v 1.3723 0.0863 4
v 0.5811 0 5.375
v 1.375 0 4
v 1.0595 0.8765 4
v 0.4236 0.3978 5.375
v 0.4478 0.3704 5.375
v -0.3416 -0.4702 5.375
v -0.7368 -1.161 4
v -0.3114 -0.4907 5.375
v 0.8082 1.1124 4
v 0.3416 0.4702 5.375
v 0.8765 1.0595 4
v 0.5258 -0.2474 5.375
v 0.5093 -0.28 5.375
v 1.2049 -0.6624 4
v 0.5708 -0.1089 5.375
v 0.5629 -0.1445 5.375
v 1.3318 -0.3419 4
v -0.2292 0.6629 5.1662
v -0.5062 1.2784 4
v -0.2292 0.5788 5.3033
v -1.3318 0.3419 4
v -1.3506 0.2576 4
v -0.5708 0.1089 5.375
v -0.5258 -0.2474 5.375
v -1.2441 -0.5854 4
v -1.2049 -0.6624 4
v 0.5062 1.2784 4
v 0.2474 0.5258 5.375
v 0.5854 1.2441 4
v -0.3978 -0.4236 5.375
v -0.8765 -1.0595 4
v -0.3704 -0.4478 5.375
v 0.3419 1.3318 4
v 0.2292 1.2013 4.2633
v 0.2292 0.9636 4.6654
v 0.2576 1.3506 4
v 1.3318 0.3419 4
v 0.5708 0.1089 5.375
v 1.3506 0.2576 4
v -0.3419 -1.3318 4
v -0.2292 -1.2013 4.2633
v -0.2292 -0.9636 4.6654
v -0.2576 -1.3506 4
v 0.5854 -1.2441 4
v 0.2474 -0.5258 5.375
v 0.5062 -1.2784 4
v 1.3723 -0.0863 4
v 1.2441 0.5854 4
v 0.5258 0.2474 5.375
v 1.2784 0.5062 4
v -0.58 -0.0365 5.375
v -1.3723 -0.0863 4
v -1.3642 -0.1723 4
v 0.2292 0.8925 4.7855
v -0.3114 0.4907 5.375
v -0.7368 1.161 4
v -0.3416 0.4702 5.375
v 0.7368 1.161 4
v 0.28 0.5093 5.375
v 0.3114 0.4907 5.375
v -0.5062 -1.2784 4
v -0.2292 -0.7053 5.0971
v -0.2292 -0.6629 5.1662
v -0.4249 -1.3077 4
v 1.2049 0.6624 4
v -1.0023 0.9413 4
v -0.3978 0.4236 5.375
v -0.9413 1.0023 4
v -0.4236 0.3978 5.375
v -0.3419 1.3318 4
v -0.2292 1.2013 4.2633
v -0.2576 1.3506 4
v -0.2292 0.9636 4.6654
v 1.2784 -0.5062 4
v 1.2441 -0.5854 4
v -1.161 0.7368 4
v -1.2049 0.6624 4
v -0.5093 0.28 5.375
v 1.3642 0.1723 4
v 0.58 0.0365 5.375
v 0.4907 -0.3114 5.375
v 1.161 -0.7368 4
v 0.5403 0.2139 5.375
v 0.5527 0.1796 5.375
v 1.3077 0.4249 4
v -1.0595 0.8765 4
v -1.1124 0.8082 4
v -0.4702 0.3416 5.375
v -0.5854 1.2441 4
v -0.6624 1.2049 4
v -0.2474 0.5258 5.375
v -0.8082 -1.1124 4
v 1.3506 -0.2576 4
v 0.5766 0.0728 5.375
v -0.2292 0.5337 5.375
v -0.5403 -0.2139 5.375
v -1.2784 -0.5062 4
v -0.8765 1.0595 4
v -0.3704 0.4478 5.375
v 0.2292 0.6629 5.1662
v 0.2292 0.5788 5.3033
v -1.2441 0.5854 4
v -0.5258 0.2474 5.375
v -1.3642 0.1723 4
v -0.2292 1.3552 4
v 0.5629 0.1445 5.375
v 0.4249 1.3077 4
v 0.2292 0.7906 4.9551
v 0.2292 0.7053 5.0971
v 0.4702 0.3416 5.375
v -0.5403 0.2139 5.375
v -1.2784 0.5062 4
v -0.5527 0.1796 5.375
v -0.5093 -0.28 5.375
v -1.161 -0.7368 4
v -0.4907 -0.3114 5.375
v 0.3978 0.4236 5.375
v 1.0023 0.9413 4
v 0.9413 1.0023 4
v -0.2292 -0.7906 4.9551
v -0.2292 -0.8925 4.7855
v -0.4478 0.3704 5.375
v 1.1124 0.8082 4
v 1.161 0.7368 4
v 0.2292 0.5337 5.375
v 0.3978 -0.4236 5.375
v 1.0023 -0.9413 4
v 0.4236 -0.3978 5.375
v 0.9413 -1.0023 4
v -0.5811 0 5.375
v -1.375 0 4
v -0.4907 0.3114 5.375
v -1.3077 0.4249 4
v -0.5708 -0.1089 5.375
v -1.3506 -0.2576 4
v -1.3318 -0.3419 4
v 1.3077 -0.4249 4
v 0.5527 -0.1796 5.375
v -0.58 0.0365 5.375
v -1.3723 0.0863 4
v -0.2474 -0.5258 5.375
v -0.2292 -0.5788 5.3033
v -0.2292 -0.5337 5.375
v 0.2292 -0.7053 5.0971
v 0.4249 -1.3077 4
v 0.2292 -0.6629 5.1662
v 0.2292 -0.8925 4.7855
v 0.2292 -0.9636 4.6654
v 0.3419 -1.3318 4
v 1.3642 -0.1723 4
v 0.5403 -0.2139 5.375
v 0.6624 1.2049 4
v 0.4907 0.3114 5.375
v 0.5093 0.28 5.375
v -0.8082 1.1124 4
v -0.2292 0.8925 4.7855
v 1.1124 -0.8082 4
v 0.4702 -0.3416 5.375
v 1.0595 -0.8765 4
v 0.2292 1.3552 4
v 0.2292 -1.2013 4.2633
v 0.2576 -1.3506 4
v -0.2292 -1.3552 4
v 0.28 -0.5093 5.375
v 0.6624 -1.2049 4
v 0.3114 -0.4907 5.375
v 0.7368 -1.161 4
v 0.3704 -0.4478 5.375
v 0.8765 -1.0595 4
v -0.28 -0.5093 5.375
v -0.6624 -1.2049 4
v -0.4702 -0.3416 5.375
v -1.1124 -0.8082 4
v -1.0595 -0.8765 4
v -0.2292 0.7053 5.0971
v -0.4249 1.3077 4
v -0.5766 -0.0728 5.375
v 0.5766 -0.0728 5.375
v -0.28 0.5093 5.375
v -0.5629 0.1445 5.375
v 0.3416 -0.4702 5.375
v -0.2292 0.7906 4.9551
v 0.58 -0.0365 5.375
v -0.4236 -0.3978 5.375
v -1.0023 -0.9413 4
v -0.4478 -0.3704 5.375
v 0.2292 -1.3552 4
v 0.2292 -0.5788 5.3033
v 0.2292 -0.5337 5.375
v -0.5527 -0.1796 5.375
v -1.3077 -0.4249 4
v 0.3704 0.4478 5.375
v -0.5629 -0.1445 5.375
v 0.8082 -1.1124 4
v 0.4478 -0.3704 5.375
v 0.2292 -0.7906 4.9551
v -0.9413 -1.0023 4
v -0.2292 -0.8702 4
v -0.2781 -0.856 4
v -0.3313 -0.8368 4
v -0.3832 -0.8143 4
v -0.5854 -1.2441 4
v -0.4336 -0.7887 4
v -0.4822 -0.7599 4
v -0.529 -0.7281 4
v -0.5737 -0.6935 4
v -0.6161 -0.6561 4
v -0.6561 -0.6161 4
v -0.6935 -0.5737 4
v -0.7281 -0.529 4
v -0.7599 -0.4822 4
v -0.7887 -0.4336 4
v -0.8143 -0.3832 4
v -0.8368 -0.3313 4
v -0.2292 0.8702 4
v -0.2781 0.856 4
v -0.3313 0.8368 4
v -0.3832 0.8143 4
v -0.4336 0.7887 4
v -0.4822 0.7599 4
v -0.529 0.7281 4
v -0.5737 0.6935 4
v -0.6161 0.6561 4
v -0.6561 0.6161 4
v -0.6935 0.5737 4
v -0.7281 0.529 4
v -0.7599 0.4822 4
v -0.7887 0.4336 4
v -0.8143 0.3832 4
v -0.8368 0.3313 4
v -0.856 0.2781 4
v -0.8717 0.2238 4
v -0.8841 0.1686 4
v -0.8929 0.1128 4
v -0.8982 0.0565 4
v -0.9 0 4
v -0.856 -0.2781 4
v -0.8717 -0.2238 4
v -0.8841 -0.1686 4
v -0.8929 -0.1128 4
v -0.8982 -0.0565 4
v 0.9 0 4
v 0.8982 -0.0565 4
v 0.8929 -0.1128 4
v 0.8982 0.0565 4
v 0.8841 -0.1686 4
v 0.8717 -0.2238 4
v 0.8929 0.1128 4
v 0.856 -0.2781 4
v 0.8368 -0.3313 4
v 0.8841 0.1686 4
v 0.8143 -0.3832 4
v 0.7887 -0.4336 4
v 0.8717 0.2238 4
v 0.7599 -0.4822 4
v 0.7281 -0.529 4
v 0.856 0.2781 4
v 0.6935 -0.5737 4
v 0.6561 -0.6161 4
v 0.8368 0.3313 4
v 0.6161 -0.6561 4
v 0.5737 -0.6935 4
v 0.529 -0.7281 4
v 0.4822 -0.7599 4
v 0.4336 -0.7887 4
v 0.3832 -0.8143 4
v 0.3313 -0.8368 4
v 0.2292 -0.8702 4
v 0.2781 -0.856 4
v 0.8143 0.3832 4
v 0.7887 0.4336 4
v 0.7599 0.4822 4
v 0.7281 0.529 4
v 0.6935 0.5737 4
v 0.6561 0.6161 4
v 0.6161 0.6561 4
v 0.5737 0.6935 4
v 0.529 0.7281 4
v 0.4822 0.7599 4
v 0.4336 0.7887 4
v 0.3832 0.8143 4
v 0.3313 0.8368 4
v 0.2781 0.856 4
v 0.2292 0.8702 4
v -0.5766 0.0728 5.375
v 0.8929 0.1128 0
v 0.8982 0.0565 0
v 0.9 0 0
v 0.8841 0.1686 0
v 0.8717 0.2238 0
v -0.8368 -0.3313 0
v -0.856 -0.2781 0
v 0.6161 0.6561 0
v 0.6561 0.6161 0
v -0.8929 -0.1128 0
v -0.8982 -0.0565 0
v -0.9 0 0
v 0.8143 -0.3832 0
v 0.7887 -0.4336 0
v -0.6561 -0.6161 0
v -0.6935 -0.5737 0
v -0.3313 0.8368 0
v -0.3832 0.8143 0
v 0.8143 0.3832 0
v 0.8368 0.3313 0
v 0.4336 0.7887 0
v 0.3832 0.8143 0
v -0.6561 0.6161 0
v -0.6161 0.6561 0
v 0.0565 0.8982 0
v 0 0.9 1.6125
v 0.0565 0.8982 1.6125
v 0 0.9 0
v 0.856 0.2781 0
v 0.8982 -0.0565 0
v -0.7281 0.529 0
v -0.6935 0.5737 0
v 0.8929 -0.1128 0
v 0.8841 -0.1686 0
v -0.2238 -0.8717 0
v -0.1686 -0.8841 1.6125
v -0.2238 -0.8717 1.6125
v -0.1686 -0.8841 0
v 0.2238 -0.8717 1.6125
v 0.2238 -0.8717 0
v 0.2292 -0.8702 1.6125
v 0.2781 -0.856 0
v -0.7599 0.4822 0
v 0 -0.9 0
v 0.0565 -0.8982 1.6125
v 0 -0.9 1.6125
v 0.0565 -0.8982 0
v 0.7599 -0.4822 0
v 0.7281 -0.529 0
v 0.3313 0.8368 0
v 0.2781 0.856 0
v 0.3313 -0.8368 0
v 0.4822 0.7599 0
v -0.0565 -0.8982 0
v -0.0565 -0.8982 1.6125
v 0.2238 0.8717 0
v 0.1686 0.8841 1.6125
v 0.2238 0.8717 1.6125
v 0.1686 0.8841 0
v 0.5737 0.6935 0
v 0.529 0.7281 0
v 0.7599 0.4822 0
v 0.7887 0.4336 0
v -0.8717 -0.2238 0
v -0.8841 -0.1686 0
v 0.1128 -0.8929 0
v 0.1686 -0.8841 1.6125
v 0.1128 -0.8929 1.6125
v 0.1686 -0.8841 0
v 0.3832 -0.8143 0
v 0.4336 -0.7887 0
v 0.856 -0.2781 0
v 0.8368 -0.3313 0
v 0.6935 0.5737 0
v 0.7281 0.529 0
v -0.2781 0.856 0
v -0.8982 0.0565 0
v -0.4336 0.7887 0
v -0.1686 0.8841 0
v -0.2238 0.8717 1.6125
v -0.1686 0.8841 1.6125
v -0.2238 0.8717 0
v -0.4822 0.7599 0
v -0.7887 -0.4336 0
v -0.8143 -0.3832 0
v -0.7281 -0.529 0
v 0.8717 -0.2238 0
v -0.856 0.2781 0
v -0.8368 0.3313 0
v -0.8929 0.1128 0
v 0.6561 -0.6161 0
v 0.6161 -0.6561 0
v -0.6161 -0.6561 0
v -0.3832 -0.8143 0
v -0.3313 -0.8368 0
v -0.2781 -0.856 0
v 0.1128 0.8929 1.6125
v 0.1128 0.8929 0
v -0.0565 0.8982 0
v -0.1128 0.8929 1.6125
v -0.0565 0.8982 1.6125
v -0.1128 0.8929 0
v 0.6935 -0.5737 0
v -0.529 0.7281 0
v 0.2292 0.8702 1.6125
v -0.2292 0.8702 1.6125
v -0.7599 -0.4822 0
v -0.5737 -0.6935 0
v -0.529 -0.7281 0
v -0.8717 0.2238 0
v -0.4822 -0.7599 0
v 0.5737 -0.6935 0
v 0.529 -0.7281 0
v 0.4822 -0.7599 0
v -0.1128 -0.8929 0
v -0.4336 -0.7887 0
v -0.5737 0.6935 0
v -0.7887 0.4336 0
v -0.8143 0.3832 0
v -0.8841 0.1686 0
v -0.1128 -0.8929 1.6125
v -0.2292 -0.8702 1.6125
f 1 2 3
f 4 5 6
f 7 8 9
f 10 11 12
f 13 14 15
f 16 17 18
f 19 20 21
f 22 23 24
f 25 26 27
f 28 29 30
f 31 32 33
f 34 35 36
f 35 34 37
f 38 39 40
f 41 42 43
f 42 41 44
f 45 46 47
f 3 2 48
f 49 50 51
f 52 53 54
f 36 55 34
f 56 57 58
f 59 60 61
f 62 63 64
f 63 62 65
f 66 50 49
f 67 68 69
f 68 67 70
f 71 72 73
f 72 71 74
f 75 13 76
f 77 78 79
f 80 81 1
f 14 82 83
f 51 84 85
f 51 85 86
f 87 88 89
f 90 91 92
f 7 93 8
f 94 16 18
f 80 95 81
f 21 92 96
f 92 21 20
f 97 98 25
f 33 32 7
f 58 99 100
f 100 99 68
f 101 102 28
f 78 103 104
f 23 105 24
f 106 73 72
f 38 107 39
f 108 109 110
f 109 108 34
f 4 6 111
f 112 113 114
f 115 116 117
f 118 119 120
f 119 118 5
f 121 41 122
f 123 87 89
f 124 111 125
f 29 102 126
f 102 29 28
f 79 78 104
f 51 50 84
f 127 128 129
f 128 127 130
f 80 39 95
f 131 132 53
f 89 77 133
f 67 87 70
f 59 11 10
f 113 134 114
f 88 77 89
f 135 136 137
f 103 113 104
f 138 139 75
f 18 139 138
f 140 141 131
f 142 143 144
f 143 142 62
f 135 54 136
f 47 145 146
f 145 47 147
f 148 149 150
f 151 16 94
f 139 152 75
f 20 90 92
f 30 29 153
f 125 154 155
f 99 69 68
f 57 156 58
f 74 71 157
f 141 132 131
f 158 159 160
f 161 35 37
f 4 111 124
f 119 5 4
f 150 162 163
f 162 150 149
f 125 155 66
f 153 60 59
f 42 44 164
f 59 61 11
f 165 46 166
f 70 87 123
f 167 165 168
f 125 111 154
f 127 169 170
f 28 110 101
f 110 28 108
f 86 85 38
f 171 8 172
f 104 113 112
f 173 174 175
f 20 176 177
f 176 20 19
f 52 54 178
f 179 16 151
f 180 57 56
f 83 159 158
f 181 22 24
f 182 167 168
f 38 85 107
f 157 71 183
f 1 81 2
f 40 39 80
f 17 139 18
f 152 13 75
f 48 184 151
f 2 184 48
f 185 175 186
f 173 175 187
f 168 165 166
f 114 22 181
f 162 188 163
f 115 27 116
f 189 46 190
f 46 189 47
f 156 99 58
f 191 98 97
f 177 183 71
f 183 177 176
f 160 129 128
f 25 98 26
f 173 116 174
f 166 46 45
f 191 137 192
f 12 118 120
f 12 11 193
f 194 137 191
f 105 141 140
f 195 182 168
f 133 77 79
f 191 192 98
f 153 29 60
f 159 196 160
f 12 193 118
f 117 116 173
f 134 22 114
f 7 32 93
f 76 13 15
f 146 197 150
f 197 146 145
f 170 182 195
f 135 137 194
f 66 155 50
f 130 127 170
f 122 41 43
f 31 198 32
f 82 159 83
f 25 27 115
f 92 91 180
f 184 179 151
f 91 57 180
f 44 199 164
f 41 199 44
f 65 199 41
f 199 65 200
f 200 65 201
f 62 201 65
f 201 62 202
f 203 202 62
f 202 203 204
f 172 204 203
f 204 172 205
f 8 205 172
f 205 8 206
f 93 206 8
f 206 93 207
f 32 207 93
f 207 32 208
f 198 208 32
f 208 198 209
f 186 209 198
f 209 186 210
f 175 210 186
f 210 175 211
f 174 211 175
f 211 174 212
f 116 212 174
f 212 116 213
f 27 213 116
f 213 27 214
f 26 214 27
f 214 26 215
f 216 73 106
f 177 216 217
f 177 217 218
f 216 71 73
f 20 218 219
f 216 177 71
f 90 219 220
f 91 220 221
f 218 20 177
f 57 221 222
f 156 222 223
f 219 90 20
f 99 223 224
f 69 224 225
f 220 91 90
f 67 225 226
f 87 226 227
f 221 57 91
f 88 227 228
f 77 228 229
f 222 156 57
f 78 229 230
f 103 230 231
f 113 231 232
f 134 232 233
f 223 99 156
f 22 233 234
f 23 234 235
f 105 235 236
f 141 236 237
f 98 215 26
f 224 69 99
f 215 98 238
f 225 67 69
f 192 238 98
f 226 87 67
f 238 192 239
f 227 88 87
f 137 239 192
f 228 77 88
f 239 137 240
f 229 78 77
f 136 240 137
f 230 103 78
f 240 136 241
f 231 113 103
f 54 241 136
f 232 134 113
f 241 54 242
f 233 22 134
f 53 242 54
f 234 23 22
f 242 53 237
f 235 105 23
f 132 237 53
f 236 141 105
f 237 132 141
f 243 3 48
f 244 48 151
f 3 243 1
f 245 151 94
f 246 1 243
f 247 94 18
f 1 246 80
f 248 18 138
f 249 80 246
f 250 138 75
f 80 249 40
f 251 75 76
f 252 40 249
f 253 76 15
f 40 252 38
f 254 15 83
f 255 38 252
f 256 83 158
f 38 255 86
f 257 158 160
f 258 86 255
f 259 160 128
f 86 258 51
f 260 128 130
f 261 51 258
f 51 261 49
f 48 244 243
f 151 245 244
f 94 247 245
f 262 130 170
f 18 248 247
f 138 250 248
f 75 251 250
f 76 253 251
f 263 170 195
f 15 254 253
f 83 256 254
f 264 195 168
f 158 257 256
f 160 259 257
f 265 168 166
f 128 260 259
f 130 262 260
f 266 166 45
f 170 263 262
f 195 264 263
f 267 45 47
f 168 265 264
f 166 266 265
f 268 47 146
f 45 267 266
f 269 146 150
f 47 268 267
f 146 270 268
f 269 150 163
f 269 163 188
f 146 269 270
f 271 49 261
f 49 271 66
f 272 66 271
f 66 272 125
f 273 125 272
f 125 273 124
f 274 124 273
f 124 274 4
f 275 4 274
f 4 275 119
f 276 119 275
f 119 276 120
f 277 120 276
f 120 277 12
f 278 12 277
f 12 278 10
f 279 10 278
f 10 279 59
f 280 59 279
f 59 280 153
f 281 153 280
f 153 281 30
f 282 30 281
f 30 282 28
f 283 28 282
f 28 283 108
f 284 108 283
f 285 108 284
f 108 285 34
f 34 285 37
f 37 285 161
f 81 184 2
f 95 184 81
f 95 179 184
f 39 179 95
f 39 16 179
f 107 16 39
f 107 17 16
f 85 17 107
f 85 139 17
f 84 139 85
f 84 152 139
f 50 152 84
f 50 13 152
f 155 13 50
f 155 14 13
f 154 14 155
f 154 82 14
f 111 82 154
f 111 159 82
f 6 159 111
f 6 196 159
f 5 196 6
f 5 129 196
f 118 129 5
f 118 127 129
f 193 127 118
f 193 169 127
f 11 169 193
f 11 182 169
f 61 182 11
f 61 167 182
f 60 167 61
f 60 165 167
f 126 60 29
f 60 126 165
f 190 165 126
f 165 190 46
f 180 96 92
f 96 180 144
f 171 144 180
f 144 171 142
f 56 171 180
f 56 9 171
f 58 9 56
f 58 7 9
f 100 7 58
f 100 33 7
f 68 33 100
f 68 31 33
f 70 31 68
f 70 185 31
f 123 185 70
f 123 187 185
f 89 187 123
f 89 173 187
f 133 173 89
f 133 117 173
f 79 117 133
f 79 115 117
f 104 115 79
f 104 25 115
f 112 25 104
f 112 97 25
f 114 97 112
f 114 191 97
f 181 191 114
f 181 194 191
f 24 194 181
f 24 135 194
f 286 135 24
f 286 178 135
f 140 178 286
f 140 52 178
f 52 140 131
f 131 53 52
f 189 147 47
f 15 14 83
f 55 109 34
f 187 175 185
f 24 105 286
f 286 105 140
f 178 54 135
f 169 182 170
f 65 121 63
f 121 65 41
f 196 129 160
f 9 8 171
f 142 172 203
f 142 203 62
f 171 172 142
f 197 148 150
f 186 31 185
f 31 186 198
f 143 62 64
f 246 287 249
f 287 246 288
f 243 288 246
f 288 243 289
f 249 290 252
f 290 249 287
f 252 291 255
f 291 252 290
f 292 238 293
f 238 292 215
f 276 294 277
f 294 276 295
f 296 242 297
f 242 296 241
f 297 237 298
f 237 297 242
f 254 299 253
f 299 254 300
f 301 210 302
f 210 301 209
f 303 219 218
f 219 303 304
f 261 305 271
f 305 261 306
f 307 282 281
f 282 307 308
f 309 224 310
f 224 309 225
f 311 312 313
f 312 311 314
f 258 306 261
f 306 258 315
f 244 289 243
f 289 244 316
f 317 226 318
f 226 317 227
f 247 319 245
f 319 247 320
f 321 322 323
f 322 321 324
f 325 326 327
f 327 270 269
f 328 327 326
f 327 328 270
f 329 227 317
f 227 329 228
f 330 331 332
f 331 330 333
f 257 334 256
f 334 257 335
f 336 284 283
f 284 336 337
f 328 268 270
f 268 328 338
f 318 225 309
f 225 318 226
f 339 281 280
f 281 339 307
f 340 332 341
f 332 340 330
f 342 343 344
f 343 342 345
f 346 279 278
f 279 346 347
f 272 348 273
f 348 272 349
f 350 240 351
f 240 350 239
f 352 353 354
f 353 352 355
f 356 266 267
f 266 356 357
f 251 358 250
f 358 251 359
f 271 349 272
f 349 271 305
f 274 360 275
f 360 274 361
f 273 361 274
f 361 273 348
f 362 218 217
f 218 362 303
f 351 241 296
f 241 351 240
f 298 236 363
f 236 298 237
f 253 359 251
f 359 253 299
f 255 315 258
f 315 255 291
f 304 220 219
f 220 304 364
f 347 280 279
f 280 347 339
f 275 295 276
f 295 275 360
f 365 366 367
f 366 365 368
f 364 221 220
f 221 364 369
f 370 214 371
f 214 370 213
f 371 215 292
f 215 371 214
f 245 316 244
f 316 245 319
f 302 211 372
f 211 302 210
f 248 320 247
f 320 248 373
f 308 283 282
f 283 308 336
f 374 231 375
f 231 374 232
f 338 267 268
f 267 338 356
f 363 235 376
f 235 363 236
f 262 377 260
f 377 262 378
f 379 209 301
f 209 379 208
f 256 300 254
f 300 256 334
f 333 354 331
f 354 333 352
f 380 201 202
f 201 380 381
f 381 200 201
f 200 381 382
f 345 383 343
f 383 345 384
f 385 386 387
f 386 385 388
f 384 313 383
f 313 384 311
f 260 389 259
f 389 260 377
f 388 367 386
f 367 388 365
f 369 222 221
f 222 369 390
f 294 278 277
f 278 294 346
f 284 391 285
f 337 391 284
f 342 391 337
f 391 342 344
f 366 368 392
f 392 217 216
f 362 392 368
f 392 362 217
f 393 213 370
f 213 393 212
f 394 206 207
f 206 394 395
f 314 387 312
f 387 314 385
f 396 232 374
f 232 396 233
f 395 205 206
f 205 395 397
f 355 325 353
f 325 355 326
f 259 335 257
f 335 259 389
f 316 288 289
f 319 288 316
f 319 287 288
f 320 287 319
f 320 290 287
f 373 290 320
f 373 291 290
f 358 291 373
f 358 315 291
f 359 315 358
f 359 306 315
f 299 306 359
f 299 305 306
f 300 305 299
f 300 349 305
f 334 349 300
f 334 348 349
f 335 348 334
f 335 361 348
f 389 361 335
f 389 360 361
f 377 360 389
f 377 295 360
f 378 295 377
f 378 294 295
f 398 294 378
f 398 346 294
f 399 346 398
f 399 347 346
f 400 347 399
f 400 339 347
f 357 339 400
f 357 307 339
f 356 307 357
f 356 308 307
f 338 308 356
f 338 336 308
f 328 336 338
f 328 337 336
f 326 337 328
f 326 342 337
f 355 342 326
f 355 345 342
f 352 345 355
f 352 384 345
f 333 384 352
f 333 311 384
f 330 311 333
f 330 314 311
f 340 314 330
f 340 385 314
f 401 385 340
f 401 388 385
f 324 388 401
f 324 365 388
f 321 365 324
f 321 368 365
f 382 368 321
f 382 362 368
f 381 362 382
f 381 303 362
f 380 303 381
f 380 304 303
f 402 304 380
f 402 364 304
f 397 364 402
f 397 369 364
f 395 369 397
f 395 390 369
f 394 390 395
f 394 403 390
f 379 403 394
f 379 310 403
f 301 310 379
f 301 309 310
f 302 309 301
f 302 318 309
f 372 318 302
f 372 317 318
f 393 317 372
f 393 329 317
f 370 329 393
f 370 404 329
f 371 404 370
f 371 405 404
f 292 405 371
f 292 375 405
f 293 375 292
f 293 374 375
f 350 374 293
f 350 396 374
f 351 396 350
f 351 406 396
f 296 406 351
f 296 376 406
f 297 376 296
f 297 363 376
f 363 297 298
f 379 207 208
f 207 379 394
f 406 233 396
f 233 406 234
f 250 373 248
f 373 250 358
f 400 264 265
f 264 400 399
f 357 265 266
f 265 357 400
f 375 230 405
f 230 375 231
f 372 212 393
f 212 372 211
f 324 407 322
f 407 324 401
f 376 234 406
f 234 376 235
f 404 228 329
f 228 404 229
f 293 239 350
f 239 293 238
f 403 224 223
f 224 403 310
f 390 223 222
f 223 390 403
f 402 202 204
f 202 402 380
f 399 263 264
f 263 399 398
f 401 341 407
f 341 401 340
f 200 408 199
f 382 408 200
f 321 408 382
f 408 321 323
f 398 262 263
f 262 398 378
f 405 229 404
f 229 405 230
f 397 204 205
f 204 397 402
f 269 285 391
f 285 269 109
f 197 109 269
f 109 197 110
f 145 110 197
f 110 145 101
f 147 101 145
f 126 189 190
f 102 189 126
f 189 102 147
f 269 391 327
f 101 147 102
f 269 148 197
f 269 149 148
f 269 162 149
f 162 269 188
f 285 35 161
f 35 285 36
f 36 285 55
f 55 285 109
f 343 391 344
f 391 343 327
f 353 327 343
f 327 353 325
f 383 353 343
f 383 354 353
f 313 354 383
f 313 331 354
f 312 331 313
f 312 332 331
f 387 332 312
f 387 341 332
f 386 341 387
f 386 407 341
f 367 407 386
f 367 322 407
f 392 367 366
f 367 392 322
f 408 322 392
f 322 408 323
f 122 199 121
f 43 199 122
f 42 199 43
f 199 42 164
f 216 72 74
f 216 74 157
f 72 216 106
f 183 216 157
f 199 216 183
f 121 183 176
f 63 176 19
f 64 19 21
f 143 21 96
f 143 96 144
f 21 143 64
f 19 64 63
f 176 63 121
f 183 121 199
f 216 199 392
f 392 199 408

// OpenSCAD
// Adapted by Cameron K. Brooks on 2024-01-26 from the following source: 
// https://www.thingiverse.com/thing:1799553/files


dia = 2;	// Snap fit diameter
lip = 0.75;	// Snap fit lip (adds to diameter)
col_h = dia * 2;
//col_h = 5;    // Snap fit Mini column height

slot_ratio = 0.7;  // Slot ratio

col_tol = 0.1;  // Column Tolerance
neg_tol = 0.5;  // Tolerance for the Neagtive Snapfit

$fn = 100;


module snapfit(diameter = dia, lip = lip, column_height = col_h, column_tolerance = col_tol, negative_tolerance = neg_tol, slot_ratio = slot_ratio) {
	z_fite = $preview ? 0.05 : 0.0;  // Z offset for preview
	// Calculated Snapfit Parameters
	head_h = (diameter+lip)/2;    // Snap fit height
	head_r1 = (diameter+lip)/2;    // Snap fit radius 1
	head_r2 = calculateRadFromAngle(180-60, head_r1, head_h);    // Snap fit radius 2
	col_r = diameter/2;    // Mini column radius

    difference() {
        union() {
            translate([0, 0, col_h+head_h/2])
                cylinder(r1 = head_r1, r2 = head_r2, h = head_h, center = true); // snapfit head

            translate([0, 0, col_h/2])
                cylinder(r = col_r-col_tol, h = col_h, center = true); // Mini column
        }
        translate([0, 0, (col_h+head_h+z_fite)-(slot_ratio*(col_h+head_h))/2])
            cube([head_r1/3, head_r1*2, slot_ratio*(col_h+head_h)], center = true); // Cut in snap fit
    }
}

module snapfit_neg() {
    union() {
        translate([0, 0, col_h])
            cylinder(r1 = head_r1 + neg_tol, r2 = head_r2 + neg_tol, h = head_h + neg_tol, center = true); // snapfit head
        translate([0, 0, col_h/2])
            cylinder(r = head_r1 - neg_tol/2, h = col_h + neg_tol, center = true); // Mini column
    }
}

// Function to calculate radius based on angle, initial radius, and height
function calculateRadFromAngle(angle, r, height) = 
    let(norm_angle = angle % 90)
    (angle < 90)
        ? r + tan((abs(90 - norm_angle))) * height
        : r - tan((norm_angle)) * height;

// Example Parameters
w = 20;   // Column diameter
h = 10;   // Main column height

module example() {
	difference() {
		union() {
			cylinder(r = w/2, h = h, center = true); // Main cylinder
			translate([0, 0, h/2])
			snapfit();
		}
		translate([0, 0, -h/2]) 
		snapfit_neg();
	}
}

snapfit();
